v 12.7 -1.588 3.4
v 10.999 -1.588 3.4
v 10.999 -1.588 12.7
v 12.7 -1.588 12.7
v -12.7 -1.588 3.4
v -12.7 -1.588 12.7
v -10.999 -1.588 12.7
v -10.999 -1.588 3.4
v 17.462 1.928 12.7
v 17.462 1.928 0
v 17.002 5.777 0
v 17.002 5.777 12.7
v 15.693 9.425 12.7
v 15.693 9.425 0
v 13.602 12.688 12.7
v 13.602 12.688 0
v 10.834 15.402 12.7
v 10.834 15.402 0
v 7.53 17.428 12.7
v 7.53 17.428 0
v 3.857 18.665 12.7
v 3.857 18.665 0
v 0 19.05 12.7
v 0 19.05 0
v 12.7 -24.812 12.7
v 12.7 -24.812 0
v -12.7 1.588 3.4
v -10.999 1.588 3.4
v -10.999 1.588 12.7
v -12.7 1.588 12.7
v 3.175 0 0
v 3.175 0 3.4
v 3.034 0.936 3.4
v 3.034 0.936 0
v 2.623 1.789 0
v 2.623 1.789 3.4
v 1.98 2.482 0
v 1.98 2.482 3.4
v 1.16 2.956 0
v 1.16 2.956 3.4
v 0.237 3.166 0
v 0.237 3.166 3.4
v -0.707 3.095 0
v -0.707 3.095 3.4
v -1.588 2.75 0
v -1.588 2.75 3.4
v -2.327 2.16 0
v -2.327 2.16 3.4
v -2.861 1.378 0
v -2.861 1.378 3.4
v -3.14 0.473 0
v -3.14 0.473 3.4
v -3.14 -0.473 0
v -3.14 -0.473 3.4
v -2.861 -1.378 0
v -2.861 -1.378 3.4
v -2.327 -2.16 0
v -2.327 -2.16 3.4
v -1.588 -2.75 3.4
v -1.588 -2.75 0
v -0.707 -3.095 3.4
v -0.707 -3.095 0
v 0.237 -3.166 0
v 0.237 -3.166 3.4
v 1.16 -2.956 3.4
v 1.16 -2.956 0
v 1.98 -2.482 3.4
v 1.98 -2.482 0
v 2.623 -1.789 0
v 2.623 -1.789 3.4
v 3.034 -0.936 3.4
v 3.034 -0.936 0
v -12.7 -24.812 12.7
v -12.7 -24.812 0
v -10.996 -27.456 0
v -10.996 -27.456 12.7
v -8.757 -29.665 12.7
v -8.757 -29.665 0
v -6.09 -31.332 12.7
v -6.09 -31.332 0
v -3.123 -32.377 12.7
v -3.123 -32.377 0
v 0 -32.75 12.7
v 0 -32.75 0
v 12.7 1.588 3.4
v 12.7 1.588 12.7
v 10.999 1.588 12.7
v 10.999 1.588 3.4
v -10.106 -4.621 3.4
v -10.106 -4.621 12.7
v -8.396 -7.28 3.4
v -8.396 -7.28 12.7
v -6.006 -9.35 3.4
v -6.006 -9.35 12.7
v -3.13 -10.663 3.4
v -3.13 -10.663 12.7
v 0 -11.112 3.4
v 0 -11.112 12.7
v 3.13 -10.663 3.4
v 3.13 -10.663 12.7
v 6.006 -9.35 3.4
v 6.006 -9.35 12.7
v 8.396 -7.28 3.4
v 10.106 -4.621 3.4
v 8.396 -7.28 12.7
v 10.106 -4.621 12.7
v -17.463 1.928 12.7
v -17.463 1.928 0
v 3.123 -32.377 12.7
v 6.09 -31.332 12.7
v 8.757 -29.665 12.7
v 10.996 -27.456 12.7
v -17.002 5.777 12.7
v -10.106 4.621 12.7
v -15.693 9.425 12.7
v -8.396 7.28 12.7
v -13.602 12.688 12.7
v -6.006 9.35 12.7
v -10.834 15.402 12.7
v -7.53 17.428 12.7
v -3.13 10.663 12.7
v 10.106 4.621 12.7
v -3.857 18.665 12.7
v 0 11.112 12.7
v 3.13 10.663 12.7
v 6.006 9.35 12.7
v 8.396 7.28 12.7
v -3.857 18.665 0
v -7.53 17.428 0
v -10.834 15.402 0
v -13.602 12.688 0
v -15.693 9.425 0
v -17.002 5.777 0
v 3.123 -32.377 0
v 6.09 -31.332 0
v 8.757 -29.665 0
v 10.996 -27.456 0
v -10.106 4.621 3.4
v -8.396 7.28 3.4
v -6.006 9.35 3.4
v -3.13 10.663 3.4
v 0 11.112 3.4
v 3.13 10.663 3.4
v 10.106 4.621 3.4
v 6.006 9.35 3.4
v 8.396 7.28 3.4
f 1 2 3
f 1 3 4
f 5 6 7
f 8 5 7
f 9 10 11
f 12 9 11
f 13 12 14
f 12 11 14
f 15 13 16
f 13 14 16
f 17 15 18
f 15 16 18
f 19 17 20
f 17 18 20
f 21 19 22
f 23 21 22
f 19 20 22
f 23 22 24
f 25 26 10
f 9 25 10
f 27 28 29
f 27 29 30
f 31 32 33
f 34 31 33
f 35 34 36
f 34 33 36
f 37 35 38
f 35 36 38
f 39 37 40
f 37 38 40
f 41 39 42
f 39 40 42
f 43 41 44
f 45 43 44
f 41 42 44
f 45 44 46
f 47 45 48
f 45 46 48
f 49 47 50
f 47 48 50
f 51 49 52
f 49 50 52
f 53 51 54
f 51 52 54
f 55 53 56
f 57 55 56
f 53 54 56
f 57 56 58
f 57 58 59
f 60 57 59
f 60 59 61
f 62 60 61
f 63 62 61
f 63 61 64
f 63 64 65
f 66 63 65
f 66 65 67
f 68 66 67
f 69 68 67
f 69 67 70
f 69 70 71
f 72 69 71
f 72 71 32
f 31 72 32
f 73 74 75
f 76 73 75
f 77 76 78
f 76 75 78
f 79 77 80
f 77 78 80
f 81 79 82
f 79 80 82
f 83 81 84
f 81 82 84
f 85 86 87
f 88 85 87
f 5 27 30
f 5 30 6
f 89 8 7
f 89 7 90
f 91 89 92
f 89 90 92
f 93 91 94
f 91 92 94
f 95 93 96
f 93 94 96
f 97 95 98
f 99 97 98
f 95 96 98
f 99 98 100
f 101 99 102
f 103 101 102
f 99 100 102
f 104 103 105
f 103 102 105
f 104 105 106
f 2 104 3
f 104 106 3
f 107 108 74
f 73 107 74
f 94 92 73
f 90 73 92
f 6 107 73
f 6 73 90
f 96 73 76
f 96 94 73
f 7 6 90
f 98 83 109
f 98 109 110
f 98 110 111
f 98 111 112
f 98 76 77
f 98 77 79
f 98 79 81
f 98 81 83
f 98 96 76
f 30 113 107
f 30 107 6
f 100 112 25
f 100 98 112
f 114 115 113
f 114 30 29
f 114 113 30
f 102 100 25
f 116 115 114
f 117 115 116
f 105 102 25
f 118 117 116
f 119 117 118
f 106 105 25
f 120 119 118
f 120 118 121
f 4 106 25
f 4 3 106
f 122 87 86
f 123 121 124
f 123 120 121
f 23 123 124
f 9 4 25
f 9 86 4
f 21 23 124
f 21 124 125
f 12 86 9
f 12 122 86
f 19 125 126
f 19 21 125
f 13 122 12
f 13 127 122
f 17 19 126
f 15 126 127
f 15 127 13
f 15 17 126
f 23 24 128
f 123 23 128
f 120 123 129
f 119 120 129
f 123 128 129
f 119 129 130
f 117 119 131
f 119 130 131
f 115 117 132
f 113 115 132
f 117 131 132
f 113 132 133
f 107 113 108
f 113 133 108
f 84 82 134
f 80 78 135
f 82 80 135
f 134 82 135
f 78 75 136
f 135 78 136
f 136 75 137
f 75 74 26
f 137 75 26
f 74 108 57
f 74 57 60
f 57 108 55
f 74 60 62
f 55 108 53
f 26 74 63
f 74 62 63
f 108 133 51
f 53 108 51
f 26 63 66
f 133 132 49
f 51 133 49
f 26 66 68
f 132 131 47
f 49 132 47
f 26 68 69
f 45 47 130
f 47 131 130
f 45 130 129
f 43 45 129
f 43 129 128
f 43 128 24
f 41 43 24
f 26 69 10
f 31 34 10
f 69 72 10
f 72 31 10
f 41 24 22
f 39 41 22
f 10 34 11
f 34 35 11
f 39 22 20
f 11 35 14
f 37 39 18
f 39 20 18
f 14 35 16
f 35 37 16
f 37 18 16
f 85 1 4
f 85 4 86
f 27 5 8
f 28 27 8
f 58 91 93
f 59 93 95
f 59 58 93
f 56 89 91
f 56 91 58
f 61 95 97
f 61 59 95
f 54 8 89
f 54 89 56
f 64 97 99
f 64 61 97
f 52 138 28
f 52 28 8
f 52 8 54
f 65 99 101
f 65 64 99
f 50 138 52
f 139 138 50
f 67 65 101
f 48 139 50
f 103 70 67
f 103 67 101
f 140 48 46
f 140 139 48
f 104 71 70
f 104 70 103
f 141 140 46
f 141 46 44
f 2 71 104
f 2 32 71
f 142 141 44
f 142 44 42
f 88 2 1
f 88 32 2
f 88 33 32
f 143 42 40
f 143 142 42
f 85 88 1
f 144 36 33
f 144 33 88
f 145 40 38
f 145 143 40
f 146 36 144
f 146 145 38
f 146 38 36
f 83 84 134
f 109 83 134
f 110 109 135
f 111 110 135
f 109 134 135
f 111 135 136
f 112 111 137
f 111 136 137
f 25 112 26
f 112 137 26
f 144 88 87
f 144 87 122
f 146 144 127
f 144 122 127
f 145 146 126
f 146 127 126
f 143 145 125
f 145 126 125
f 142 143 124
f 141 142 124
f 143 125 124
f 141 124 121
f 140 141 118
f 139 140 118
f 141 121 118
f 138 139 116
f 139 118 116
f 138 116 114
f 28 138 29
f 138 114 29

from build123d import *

# Parameters (mm, degrees)
F1_DEPTH = 12.7
F2_R     = 3.175
F3_DEPTH = 9.3
F4_DEPTH = 25.4


# Not quite as in the source:
# - ends of sketch curves that miss each other by under 0.0002 mm in the source are joined


with BuildPart() as f1:
    # F0 (on Top) → F1 (new body)
    with BuildSketch(Plane.XY):
        with BuildLine():
            ThreePointArc((0, -32.75), (7.4692491087, -30.572048574), (12.7, -24.8125))
            Line((12.7, -24.8125), (17.4625, 1.9280540291))
            ThreePointArc((17.4625, 1.9280540291), (12.2942741687, 14.1229194267), (0, 19.05))
            ThreePointArc((0, 19.05), (-12.2942741687, 14.1229194267), (-17.4625, 1.9280540291))
            Line((-17.4625, 1.9280540291), (-12.7, -24.8125))
            ThreePointArc((-12.7, -24.8125), (-7.4692491087, -30.572048574), (0, -32.75))
        make_face()
    extrude(amount=F1_DEPTH)

    # F2 (on face) → F3 (cut)
    with BuildSketch(Plane.XY.offset(12.7)):
        with BuildLine():
            Line((12.7, 1.5875), (10.9985226281, 1.5875))
            ThreePointArc((10.9985226281, 1.5875), (0, 11.1125), (-10.9985226281, 1.5875))
            Line((-10.9985226281, 1.5875), (-12.7, 1.5875))
            Line((-12.7, 1.5875), (-12.7, 0))
            Line((-12.7, 0), (-12.7, -1.5875))
            Line((-12.7, -1.5875), (-10.9985226281, -1.5875))
            ThreePointArc((-10.9985226281, -1.5875), (0, -11.1125), (10.9985226281, -1.5875))
            Line((10.9985226281, -1.5875), (12.7, -1.5875))
            Line((12.7, -1.5875), (12.7, 0))
            Line((12.7, 0), (12.7, 1.5875))
        make_face()
        Circle(F2_R, mode=Mode.SUBTRACT)
    extrude(amount=-F3_DEPTH, mode=Mode.SUBTRACT)

    # F4 (cut): a face of the model
    f4_faces = [f1.faces().sort_by_distance(p)[0] for p in [
        (0, 0, 12.7),
    ]]
    extrude(f4_faces, amount=-F4_DEPTH, mode=Mode.SUBTRACT)


solid = f1.part
